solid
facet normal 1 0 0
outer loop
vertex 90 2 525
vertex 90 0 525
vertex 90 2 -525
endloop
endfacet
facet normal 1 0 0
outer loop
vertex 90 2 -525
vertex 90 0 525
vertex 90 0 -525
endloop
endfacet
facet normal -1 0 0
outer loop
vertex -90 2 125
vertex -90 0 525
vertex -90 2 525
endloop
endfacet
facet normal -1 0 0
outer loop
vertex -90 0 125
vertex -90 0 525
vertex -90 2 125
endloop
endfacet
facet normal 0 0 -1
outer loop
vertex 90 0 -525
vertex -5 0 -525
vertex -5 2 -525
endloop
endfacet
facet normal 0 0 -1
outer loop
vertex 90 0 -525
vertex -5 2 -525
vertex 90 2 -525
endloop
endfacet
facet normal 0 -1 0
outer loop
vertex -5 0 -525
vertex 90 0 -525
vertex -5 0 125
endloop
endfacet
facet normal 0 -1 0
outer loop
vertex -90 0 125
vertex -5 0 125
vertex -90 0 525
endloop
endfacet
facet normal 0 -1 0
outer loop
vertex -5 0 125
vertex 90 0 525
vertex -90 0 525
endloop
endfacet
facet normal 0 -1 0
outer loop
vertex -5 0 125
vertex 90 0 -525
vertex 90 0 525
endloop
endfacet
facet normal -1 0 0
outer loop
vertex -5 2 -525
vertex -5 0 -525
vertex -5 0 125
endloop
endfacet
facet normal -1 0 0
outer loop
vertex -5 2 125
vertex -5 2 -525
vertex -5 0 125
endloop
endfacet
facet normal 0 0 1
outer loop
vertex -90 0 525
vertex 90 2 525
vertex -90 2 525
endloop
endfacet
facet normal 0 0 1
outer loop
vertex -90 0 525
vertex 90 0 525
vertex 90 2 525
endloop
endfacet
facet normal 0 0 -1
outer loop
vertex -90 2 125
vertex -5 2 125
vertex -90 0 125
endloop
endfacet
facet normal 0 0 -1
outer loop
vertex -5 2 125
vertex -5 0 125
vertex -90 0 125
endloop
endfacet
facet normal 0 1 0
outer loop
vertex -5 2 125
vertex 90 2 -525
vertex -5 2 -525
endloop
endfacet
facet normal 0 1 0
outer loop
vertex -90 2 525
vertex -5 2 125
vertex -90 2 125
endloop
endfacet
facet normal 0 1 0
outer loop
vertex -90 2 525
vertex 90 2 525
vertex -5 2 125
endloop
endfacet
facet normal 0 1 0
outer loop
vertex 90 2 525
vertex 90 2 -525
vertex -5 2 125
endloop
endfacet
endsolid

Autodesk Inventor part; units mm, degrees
ref_plane "YZ Plane" through (0, 0, 0) normal (1, 0, 0) x (0, 1, 0)
ref_plane "XZ Plane" through (0, 0, 0) normal (0, 1, 0) x (-1, 0, 0)
ref_plane "XY Plane" through (0, 0, 0) normal (0, 0, 1) x (1, 0, 0)
sketch "Sketch1" plane through (0, 0, 0) normal (0, 1, 0) x (-1, 0, 0)
  line L0 (5, -525) -> (-90, -525)
  line L1 (-90, 525) -> (90, 525)
  line L2 (0, 525) -> (0, -525)
  line L3 (5, -525) -> (5, 125)
  line L4 (5, 125) -> (90, 125)
  line L5 (90, 525) -> (90, 125)
  line L6 (5, 0) -> (-90, 0)
  line L7 (-90, 525) -> (-90, -525)
  point P0 (0, 0)
  dimension "d6" = 1050
  dimension "d7" = 180
  dimension "d8" = 85
  dimension "d10" = 650
extrude "Extrusion1" add sketch "Sketch1" along normal blind 2
properties part number "Si" material "LCP Plastic"
